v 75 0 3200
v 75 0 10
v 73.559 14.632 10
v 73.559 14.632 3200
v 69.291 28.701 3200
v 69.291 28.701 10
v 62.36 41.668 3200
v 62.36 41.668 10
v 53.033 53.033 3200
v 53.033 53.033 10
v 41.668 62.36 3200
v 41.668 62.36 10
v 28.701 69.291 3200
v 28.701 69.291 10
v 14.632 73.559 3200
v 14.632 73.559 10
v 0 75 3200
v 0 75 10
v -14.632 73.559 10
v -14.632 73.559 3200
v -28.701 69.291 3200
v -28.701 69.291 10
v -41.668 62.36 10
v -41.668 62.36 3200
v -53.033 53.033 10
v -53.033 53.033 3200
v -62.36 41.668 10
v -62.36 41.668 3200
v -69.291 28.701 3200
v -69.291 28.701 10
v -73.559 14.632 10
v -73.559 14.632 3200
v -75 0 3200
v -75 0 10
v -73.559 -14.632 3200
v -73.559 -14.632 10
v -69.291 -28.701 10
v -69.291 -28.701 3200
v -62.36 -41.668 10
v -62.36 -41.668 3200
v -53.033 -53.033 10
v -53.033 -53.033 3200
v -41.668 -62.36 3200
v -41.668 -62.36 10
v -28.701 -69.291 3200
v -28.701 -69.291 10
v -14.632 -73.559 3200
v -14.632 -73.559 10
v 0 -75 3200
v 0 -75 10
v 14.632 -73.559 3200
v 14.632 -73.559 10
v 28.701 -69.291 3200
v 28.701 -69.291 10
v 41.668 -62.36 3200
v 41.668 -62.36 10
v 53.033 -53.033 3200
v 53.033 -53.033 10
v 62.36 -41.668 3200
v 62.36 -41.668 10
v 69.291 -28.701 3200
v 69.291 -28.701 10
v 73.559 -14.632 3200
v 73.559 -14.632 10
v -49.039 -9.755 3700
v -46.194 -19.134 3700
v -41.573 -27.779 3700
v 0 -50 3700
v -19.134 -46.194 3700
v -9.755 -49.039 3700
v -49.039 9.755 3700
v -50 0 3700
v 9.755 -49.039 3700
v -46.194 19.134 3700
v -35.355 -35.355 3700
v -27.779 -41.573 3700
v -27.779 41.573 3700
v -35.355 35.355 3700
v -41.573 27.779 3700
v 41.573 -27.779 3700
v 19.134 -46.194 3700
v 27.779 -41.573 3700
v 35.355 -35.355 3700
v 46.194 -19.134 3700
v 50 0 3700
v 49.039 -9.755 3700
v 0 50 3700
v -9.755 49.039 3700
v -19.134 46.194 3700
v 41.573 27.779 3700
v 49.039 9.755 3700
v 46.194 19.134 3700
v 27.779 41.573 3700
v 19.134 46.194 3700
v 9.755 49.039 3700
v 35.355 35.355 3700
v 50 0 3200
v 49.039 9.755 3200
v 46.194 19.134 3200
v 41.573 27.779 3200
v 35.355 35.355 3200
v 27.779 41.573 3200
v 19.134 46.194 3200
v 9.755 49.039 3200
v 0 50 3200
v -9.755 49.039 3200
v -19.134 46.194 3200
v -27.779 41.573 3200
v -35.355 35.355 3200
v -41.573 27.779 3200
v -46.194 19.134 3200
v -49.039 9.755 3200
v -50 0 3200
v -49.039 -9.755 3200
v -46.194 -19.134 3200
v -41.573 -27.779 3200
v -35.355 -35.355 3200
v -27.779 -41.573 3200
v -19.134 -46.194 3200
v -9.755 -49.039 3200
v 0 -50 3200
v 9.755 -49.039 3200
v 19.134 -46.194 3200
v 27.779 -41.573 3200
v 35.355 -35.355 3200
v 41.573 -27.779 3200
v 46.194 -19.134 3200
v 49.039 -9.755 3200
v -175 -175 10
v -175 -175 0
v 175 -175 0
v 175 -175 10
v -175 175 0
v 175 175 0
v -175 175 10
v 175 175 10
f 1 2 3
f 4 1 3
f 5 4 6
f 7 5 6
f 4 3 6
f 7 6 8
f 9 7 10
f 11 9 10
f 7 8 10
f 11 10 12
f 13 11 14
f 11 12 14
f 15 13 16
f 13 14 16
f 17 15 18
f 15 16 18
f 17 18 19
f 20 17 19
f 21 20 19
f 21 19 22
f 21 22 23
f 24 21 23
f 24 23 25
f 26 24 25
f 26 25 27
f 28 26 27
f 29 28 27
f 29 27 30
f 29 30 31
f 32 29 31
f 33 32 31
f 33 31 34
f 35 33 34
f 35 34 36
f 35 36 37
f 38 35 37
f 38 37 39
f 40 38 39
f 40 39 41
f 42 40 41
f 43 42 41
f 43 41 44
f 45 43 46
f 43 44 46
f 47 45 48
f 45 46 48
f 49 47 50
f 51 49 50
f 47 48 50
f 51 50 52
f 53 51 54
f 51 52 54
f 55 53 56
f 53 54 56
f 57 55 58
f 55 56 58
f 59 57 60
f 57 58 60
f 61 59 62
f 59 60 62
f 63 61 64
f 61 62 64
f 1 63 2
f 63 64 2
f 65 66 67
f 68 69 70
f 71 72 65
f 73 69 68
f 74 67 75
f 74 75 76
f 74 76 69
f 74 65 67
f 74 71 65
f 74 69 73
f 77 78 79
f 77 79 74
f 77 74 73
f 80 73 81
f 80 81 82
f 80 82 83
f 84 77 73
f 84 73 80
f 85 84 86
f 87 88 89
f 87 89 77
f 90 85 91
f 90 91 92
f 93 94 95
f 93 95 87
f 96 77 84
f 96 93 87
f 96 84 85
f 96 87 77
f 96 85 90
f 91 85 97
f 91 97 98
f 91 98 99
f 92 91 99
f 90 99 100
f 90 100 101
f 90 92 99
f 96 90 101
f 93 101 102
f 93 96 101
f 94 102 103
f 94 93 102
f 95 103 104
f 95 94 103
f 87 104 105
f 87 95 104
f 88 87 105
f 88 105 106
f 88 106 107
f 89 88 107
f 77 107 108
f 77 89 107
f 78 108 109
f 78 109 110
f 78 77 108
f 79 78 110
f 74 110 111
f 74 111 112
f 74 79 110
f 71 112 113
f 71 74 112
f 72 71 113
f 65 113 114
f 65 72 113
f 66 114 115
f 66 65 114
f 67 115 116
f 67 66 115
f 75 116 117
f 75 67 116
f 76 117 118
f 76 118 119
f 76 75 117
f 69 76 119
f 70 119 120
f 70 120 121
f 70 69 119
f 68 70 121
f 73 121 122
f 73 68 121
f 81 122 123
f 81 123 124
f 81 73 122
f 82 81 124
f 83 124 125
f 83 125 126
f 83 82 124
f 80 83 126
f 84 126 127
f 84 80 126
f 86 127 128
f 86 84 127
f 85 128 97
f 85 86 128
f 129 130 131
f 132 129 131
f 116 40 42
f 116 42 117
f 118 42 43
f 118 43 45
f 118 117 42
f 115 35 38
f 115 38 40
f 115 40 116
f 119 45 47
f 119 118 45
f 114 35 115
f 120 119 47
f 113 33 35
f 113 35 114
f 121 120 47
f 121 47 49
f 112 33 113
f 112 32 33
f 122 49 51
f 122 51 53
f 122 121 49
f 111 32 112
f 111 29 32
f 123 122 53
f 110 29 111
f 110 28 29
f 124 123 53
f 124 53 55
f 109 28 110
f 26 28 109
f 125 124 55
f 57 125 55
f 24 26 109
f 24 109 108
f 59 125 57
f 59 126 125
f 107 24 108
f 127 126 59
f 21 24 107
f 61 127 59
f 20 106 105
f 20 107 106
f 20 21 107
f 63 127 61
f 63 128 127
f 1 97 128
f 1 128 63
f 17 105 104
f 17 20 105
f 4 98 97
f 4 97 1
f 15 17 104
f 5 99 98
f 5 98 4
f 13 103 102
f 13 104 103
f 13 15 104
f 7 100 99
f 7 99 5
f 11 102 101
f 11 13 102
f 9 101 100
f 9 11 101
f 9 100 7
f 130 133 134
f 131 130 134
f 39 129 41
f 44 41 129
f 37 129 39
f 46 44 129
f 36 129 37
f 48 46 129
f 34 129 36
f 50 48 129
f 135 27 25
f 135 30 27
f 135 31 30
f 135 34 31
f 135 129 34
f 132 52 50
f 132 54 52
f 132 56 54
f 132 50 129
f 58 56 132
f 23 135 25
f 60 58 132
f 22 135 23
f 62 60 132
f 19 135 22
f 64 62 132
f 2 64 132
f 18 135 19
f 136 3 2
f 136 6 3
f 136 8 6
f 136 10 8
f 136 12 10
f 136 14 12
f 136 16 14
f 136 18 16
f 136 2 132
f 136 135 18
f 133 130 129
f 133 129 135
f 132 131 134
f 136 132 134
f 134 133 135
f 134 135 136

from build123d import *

# Parameters (mm, degrees)
F0_W     = 350
F0_H     = 350
F1_DEPTH = 10
F2_R     = 75
F3_DEPTH = 3690
F4_R     = 75
F4_R_2   = 50
F5_DEPTH = 500


with BuildPart() as f1:
    # F0 (on Top) → F1 (new body)
    with BuildSketch(Plane.XY):
        Rectangle(F0_W, F0_H)
    extrude(amount=F1_DEPTH)

    # F2 (on face) → F3 (join)
    with BuildSketch(Plane.XY.offset(10)):
        Circle(F2_R)
    extrude(amount=F3_DEPTH)

    # F4 (on face) → F5 (cut)
    with BuildSketch(Plane.XY.offset(3700)):
        Circle(F4_R)
        Circle(F4_R_2, mode=Mode.SUBTRACT)
    extrude(amount=-F5_DEPTH, mode=Mode.SUBTRACT)


solid = f1.part
